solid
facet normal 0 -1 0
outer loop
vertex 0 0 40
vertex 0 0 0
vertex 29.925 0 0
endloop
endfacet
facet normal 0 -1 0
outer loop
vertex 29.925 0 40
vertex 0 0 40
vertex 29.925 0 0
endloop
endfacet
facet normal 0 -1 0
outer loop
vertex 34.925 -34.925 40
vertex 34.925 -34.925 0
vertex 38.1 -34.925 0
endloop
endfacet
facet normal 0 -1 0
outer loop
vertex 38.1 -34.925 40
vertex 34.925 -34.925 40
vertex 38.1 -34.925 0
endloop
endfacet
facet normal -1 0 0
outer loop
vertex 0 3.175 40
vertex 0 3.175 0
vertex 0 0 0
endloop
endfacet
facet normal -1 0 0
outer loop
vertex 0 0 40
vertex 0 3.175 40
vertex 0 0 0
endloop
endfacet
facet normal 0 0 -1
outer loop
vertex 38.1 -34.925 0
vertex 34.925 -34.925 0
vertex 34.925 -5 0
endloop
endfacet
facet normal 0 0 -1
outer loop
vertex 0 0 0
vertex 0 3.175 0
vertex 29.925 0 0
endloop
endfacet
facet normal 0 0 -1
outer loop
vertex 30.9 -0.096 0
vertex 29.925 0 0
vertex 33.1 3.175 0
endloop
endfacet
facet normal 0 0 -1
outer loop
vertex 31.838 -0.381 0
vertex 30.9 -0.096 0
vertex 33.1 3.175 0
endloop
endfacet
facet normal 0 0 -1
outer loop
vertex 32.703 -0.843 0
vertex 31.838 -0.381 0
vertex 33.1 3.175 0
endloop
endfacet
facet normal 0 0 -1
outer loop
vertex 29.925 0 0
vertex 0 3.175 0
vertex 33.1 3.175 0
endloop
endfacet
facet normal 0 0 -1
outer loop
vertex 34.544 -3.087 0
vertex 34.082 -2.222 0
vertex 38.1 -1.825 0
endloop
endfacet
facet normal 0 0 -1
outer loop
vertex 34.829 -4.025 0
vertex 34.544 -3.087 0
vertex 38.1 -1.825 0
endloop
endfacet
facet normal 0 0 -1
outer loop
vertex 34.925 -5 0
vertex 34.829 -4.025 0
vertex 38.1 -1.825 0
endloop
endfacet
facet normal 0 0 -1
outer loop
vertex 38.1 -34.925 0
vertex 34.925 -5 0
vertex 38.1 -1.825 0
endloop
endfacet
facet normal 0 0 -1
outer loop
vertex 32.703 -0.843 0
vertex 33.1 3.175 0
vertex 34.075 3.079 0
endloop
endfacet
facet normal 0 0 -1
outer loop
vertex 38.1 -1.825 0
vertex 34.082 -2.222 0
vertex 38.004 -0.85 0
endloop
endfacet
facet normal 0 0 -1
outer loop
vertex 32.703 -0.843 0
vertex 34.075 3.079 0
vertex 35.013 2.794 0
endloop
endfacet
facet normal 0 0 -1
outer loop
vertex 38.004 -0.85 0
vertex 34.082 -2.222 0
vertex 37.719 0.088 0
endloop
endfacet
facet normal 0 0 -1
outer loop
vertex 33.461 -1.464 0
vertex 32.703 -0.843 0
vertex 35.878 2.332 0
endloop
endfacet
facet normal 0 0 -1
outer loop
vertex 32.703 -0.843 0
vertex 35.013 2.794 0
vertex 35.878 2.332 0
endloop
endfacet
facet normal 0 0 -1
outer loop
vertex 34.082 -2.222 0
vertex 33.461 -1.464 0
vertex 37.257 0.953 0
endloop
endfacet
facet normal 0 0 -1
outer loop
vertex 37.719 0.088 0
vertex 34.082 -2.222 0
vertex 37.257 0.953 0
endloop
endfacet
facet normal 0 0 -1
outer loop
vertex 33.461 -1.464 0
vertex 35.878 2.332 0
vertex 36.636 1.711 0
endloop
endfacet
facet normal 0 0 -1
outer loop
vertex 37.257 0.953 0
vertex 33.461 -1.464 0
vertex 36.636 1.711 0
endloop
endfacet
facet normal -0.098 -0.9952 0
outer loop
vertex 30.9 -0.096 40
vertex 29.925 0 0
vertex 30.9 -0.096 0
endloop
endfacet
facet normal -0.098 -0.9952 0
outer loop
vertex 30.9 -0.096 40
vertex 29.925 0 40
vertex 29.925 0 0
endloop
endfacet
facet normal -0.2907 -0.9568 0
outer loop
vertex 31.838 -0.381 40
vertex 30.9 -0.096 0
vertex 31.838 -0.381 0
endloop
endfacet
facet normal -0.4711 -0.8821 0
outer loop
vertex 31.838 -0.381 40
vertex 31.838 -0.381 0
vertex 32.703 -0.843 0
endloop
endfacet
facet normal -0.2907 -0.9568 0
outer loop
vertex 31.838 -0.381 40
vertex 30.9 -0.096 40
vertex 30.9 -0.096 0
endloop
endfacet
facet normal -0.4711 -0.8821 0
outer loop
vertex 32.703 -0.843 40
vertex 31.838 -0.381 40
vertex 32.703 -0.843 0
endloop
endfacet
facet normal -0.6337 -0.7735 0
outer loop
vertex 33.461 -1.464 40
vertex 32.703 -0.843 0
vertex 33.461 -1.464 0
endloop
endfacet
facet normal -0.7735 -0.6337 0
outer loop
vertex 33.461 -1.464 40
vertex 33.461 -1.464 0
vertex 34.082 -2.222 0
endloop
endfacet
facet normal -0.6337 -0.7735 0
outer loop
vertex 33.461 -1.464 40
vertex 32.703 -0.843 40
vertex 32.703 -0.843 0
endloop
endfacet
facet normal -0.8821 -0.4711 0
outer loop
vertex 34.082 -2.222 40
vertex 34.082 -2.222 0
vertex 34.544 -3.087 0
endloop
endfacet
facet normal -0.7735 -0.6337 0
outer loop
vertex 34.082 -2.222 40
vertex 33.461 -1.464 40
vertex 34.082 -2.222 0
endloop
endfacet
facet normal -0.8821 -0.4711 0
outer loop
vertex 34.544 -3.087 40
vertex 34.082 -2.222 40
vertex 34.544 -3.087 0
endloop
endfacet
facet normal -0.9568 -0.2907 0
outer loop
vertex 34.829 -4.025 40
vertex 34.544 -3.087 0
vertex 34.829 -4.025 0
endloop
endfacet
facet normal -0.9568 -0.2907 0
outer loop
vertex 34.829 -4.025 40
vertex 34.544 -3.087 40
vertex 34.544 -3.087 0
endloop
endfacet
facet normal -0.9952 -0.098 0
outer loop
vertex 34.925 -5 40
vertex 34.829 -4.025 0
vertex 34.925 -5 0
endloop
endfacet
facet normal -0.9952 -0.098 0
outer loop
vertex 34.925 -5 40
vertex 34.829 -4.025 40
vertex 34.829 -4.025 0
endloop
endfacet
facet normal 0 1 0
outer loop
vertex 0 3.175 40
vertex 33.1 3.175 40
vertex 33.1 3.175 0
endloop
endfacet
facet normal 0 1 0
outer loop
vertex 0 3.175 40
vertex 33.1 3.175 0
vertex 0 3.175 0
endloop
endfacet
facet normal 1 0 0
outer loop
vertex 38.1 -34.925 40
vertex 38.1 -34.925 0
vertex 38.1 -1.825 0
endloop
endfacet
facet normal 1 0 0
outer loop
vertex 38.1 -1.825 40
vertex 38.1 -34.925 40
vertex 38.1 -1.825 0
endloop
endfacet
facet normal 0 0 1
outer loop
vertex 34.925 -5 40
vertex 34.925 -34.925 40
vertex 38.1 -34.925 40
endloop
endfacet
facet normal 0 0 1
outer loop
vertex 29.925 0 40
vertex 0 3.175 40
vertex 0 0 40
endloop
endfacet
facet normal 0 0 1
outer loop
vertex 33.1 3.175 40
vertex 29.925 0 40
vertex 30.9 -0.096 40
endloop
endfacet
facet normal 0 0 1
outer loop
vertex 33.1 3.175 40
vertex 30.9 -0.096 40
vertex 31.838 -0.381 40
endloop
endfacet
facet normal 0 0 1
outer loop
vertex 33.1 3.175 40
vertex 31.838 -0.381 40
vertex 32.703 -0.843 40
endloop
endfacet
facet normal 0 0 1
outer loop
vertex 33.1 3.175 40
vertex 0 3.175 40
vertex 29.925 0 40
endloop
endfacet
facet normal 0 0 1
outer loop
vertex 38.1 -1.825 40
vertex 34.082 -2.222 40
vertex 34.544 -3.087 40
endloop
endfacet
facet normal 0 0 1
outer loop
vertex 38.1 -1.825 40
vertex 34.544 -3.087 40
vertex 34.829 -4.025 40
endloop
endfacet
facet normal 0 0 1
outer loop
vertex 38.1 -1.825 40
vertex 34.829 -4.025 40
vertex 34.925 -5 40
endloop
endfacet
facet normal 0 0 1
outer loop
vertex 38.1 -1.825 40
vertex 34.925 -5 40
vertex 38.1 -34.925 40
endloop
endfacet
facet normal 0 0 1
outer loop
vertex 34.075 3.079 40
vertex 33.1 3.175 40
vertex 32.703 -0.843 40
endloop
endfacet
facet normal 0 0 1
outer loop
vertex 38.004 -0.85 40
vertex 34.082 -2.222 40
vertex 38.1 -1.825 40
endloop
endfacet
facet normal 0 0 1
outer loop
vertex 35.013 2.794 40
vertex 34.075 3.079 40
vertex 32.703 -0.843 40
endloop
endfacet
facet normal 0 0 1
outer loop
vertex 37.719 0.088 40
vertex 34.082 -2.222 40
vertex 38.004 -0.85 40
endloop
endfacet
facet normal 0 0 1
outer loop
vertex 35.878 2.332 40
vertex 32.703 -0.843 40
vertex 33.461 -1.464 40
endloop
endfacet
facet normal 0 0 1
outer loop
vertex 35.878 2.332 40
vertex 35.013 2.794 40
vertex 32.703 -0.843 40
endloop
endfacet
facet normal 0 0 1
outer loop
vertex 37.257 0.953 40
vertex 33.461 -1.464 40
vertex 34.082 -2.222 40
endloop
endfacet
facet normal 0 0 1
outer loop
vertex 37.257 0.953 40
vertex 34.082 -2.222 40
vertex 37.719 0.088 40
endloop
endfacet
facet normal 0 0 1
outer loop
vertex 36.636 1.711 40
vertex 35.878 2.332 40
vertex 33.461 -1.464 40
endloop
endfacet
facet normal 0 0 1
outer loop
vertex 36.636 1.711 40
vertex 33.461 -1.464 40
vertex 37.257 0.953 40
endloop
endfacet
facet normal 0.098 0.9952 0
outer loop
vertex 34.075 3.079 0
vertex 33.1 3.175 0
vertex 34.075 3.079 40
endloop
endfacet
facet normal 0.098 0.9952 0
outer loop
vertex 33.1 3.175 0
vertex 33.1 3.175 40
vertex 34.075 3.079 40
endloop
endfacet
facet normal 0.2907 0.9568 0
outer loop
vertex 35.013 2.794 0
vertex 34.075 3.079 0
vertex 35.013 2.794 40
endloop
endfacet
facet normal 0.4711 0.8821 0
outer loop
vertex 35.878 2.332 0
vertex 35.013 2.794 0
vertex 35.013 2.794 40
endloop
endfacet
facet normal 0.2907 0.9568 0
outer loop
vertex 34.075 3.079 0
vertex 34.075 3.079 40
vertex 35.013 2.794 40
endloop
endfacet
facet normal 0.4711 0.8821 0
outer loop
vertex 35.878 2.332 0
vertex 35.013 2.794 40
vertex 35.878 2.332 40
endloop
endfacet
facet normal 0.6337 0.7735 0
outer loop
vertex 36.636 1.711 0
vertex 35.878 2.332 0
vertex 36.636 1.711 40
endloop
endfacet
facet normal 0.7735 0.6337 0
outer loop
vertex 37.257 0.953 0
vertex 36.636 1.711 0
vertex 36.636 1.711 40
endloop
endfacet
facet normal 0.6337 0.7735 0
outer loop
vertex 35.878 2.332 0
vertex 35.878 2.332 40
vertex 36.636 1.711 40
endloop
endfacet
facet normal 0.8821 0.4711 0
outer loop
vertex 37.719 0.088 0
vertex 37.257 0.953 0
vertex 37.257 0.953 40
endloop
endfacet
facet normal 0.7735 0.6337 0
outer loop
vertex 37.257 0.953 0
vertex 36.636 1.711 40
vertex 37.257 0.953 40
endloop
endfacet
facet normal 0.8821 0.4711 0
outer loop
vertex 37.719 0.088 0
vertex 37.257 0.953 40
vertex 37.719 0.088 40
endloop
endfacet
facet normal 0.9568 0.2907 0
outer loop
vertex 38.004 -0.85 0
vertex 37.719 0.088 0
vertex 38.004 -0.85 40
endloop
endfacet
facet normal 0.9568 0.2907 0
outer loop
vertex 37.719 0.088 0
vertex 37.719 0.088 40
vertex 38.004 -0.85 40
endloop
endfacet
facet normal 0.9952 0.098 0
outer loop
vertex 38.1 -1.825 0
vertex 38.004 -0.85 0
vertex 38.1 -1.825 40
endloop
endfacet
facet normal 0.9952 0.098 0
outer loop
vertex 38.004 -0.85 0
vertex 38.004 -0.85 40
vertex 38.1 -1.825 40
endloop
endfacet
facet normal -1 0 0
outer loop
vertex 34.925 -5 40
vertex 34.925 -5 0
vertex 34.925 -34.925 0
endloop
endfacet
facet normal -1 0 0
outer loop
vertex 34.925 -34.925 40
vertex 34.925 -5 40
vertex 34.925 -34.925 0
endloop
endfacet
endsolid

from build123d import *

# Parameters (mm, degrees)
BOSS_EXTRUDE1_DEPTH = 40
FILLET1_R           = 5
FILLET2_R           = 5


with BuildPart() as part:
    # Sketch1 → Boss-Extrude1 (new body)
    with BuildSketch(Plane.XY):
        Polygon((0, 0), (34.925, 0), (34.925, -34.925), (38.1, -34.925), (38.1, 0), (38.1, 3.175), (0, 3.175), align=None)
    extrude(amount=BOSS_EXTRUDE1_DEPTH)

    # Fillet1
    fillet1_edges = [part.edges().sort_by_distance(p)[0] for p in [
        (34.925, 0, 20),
    ]]
    fillet(fillet1_edges, radius=FILLET1_R)

    # Fillet2
    fillet2_edges = [part.edges().sort_by_distance(p)[0] for p in [
        (38.1, 3.175, 20),
    ]]
    fillet(fillet2_edges, radius=FILLET2_R)


solid = part.part
